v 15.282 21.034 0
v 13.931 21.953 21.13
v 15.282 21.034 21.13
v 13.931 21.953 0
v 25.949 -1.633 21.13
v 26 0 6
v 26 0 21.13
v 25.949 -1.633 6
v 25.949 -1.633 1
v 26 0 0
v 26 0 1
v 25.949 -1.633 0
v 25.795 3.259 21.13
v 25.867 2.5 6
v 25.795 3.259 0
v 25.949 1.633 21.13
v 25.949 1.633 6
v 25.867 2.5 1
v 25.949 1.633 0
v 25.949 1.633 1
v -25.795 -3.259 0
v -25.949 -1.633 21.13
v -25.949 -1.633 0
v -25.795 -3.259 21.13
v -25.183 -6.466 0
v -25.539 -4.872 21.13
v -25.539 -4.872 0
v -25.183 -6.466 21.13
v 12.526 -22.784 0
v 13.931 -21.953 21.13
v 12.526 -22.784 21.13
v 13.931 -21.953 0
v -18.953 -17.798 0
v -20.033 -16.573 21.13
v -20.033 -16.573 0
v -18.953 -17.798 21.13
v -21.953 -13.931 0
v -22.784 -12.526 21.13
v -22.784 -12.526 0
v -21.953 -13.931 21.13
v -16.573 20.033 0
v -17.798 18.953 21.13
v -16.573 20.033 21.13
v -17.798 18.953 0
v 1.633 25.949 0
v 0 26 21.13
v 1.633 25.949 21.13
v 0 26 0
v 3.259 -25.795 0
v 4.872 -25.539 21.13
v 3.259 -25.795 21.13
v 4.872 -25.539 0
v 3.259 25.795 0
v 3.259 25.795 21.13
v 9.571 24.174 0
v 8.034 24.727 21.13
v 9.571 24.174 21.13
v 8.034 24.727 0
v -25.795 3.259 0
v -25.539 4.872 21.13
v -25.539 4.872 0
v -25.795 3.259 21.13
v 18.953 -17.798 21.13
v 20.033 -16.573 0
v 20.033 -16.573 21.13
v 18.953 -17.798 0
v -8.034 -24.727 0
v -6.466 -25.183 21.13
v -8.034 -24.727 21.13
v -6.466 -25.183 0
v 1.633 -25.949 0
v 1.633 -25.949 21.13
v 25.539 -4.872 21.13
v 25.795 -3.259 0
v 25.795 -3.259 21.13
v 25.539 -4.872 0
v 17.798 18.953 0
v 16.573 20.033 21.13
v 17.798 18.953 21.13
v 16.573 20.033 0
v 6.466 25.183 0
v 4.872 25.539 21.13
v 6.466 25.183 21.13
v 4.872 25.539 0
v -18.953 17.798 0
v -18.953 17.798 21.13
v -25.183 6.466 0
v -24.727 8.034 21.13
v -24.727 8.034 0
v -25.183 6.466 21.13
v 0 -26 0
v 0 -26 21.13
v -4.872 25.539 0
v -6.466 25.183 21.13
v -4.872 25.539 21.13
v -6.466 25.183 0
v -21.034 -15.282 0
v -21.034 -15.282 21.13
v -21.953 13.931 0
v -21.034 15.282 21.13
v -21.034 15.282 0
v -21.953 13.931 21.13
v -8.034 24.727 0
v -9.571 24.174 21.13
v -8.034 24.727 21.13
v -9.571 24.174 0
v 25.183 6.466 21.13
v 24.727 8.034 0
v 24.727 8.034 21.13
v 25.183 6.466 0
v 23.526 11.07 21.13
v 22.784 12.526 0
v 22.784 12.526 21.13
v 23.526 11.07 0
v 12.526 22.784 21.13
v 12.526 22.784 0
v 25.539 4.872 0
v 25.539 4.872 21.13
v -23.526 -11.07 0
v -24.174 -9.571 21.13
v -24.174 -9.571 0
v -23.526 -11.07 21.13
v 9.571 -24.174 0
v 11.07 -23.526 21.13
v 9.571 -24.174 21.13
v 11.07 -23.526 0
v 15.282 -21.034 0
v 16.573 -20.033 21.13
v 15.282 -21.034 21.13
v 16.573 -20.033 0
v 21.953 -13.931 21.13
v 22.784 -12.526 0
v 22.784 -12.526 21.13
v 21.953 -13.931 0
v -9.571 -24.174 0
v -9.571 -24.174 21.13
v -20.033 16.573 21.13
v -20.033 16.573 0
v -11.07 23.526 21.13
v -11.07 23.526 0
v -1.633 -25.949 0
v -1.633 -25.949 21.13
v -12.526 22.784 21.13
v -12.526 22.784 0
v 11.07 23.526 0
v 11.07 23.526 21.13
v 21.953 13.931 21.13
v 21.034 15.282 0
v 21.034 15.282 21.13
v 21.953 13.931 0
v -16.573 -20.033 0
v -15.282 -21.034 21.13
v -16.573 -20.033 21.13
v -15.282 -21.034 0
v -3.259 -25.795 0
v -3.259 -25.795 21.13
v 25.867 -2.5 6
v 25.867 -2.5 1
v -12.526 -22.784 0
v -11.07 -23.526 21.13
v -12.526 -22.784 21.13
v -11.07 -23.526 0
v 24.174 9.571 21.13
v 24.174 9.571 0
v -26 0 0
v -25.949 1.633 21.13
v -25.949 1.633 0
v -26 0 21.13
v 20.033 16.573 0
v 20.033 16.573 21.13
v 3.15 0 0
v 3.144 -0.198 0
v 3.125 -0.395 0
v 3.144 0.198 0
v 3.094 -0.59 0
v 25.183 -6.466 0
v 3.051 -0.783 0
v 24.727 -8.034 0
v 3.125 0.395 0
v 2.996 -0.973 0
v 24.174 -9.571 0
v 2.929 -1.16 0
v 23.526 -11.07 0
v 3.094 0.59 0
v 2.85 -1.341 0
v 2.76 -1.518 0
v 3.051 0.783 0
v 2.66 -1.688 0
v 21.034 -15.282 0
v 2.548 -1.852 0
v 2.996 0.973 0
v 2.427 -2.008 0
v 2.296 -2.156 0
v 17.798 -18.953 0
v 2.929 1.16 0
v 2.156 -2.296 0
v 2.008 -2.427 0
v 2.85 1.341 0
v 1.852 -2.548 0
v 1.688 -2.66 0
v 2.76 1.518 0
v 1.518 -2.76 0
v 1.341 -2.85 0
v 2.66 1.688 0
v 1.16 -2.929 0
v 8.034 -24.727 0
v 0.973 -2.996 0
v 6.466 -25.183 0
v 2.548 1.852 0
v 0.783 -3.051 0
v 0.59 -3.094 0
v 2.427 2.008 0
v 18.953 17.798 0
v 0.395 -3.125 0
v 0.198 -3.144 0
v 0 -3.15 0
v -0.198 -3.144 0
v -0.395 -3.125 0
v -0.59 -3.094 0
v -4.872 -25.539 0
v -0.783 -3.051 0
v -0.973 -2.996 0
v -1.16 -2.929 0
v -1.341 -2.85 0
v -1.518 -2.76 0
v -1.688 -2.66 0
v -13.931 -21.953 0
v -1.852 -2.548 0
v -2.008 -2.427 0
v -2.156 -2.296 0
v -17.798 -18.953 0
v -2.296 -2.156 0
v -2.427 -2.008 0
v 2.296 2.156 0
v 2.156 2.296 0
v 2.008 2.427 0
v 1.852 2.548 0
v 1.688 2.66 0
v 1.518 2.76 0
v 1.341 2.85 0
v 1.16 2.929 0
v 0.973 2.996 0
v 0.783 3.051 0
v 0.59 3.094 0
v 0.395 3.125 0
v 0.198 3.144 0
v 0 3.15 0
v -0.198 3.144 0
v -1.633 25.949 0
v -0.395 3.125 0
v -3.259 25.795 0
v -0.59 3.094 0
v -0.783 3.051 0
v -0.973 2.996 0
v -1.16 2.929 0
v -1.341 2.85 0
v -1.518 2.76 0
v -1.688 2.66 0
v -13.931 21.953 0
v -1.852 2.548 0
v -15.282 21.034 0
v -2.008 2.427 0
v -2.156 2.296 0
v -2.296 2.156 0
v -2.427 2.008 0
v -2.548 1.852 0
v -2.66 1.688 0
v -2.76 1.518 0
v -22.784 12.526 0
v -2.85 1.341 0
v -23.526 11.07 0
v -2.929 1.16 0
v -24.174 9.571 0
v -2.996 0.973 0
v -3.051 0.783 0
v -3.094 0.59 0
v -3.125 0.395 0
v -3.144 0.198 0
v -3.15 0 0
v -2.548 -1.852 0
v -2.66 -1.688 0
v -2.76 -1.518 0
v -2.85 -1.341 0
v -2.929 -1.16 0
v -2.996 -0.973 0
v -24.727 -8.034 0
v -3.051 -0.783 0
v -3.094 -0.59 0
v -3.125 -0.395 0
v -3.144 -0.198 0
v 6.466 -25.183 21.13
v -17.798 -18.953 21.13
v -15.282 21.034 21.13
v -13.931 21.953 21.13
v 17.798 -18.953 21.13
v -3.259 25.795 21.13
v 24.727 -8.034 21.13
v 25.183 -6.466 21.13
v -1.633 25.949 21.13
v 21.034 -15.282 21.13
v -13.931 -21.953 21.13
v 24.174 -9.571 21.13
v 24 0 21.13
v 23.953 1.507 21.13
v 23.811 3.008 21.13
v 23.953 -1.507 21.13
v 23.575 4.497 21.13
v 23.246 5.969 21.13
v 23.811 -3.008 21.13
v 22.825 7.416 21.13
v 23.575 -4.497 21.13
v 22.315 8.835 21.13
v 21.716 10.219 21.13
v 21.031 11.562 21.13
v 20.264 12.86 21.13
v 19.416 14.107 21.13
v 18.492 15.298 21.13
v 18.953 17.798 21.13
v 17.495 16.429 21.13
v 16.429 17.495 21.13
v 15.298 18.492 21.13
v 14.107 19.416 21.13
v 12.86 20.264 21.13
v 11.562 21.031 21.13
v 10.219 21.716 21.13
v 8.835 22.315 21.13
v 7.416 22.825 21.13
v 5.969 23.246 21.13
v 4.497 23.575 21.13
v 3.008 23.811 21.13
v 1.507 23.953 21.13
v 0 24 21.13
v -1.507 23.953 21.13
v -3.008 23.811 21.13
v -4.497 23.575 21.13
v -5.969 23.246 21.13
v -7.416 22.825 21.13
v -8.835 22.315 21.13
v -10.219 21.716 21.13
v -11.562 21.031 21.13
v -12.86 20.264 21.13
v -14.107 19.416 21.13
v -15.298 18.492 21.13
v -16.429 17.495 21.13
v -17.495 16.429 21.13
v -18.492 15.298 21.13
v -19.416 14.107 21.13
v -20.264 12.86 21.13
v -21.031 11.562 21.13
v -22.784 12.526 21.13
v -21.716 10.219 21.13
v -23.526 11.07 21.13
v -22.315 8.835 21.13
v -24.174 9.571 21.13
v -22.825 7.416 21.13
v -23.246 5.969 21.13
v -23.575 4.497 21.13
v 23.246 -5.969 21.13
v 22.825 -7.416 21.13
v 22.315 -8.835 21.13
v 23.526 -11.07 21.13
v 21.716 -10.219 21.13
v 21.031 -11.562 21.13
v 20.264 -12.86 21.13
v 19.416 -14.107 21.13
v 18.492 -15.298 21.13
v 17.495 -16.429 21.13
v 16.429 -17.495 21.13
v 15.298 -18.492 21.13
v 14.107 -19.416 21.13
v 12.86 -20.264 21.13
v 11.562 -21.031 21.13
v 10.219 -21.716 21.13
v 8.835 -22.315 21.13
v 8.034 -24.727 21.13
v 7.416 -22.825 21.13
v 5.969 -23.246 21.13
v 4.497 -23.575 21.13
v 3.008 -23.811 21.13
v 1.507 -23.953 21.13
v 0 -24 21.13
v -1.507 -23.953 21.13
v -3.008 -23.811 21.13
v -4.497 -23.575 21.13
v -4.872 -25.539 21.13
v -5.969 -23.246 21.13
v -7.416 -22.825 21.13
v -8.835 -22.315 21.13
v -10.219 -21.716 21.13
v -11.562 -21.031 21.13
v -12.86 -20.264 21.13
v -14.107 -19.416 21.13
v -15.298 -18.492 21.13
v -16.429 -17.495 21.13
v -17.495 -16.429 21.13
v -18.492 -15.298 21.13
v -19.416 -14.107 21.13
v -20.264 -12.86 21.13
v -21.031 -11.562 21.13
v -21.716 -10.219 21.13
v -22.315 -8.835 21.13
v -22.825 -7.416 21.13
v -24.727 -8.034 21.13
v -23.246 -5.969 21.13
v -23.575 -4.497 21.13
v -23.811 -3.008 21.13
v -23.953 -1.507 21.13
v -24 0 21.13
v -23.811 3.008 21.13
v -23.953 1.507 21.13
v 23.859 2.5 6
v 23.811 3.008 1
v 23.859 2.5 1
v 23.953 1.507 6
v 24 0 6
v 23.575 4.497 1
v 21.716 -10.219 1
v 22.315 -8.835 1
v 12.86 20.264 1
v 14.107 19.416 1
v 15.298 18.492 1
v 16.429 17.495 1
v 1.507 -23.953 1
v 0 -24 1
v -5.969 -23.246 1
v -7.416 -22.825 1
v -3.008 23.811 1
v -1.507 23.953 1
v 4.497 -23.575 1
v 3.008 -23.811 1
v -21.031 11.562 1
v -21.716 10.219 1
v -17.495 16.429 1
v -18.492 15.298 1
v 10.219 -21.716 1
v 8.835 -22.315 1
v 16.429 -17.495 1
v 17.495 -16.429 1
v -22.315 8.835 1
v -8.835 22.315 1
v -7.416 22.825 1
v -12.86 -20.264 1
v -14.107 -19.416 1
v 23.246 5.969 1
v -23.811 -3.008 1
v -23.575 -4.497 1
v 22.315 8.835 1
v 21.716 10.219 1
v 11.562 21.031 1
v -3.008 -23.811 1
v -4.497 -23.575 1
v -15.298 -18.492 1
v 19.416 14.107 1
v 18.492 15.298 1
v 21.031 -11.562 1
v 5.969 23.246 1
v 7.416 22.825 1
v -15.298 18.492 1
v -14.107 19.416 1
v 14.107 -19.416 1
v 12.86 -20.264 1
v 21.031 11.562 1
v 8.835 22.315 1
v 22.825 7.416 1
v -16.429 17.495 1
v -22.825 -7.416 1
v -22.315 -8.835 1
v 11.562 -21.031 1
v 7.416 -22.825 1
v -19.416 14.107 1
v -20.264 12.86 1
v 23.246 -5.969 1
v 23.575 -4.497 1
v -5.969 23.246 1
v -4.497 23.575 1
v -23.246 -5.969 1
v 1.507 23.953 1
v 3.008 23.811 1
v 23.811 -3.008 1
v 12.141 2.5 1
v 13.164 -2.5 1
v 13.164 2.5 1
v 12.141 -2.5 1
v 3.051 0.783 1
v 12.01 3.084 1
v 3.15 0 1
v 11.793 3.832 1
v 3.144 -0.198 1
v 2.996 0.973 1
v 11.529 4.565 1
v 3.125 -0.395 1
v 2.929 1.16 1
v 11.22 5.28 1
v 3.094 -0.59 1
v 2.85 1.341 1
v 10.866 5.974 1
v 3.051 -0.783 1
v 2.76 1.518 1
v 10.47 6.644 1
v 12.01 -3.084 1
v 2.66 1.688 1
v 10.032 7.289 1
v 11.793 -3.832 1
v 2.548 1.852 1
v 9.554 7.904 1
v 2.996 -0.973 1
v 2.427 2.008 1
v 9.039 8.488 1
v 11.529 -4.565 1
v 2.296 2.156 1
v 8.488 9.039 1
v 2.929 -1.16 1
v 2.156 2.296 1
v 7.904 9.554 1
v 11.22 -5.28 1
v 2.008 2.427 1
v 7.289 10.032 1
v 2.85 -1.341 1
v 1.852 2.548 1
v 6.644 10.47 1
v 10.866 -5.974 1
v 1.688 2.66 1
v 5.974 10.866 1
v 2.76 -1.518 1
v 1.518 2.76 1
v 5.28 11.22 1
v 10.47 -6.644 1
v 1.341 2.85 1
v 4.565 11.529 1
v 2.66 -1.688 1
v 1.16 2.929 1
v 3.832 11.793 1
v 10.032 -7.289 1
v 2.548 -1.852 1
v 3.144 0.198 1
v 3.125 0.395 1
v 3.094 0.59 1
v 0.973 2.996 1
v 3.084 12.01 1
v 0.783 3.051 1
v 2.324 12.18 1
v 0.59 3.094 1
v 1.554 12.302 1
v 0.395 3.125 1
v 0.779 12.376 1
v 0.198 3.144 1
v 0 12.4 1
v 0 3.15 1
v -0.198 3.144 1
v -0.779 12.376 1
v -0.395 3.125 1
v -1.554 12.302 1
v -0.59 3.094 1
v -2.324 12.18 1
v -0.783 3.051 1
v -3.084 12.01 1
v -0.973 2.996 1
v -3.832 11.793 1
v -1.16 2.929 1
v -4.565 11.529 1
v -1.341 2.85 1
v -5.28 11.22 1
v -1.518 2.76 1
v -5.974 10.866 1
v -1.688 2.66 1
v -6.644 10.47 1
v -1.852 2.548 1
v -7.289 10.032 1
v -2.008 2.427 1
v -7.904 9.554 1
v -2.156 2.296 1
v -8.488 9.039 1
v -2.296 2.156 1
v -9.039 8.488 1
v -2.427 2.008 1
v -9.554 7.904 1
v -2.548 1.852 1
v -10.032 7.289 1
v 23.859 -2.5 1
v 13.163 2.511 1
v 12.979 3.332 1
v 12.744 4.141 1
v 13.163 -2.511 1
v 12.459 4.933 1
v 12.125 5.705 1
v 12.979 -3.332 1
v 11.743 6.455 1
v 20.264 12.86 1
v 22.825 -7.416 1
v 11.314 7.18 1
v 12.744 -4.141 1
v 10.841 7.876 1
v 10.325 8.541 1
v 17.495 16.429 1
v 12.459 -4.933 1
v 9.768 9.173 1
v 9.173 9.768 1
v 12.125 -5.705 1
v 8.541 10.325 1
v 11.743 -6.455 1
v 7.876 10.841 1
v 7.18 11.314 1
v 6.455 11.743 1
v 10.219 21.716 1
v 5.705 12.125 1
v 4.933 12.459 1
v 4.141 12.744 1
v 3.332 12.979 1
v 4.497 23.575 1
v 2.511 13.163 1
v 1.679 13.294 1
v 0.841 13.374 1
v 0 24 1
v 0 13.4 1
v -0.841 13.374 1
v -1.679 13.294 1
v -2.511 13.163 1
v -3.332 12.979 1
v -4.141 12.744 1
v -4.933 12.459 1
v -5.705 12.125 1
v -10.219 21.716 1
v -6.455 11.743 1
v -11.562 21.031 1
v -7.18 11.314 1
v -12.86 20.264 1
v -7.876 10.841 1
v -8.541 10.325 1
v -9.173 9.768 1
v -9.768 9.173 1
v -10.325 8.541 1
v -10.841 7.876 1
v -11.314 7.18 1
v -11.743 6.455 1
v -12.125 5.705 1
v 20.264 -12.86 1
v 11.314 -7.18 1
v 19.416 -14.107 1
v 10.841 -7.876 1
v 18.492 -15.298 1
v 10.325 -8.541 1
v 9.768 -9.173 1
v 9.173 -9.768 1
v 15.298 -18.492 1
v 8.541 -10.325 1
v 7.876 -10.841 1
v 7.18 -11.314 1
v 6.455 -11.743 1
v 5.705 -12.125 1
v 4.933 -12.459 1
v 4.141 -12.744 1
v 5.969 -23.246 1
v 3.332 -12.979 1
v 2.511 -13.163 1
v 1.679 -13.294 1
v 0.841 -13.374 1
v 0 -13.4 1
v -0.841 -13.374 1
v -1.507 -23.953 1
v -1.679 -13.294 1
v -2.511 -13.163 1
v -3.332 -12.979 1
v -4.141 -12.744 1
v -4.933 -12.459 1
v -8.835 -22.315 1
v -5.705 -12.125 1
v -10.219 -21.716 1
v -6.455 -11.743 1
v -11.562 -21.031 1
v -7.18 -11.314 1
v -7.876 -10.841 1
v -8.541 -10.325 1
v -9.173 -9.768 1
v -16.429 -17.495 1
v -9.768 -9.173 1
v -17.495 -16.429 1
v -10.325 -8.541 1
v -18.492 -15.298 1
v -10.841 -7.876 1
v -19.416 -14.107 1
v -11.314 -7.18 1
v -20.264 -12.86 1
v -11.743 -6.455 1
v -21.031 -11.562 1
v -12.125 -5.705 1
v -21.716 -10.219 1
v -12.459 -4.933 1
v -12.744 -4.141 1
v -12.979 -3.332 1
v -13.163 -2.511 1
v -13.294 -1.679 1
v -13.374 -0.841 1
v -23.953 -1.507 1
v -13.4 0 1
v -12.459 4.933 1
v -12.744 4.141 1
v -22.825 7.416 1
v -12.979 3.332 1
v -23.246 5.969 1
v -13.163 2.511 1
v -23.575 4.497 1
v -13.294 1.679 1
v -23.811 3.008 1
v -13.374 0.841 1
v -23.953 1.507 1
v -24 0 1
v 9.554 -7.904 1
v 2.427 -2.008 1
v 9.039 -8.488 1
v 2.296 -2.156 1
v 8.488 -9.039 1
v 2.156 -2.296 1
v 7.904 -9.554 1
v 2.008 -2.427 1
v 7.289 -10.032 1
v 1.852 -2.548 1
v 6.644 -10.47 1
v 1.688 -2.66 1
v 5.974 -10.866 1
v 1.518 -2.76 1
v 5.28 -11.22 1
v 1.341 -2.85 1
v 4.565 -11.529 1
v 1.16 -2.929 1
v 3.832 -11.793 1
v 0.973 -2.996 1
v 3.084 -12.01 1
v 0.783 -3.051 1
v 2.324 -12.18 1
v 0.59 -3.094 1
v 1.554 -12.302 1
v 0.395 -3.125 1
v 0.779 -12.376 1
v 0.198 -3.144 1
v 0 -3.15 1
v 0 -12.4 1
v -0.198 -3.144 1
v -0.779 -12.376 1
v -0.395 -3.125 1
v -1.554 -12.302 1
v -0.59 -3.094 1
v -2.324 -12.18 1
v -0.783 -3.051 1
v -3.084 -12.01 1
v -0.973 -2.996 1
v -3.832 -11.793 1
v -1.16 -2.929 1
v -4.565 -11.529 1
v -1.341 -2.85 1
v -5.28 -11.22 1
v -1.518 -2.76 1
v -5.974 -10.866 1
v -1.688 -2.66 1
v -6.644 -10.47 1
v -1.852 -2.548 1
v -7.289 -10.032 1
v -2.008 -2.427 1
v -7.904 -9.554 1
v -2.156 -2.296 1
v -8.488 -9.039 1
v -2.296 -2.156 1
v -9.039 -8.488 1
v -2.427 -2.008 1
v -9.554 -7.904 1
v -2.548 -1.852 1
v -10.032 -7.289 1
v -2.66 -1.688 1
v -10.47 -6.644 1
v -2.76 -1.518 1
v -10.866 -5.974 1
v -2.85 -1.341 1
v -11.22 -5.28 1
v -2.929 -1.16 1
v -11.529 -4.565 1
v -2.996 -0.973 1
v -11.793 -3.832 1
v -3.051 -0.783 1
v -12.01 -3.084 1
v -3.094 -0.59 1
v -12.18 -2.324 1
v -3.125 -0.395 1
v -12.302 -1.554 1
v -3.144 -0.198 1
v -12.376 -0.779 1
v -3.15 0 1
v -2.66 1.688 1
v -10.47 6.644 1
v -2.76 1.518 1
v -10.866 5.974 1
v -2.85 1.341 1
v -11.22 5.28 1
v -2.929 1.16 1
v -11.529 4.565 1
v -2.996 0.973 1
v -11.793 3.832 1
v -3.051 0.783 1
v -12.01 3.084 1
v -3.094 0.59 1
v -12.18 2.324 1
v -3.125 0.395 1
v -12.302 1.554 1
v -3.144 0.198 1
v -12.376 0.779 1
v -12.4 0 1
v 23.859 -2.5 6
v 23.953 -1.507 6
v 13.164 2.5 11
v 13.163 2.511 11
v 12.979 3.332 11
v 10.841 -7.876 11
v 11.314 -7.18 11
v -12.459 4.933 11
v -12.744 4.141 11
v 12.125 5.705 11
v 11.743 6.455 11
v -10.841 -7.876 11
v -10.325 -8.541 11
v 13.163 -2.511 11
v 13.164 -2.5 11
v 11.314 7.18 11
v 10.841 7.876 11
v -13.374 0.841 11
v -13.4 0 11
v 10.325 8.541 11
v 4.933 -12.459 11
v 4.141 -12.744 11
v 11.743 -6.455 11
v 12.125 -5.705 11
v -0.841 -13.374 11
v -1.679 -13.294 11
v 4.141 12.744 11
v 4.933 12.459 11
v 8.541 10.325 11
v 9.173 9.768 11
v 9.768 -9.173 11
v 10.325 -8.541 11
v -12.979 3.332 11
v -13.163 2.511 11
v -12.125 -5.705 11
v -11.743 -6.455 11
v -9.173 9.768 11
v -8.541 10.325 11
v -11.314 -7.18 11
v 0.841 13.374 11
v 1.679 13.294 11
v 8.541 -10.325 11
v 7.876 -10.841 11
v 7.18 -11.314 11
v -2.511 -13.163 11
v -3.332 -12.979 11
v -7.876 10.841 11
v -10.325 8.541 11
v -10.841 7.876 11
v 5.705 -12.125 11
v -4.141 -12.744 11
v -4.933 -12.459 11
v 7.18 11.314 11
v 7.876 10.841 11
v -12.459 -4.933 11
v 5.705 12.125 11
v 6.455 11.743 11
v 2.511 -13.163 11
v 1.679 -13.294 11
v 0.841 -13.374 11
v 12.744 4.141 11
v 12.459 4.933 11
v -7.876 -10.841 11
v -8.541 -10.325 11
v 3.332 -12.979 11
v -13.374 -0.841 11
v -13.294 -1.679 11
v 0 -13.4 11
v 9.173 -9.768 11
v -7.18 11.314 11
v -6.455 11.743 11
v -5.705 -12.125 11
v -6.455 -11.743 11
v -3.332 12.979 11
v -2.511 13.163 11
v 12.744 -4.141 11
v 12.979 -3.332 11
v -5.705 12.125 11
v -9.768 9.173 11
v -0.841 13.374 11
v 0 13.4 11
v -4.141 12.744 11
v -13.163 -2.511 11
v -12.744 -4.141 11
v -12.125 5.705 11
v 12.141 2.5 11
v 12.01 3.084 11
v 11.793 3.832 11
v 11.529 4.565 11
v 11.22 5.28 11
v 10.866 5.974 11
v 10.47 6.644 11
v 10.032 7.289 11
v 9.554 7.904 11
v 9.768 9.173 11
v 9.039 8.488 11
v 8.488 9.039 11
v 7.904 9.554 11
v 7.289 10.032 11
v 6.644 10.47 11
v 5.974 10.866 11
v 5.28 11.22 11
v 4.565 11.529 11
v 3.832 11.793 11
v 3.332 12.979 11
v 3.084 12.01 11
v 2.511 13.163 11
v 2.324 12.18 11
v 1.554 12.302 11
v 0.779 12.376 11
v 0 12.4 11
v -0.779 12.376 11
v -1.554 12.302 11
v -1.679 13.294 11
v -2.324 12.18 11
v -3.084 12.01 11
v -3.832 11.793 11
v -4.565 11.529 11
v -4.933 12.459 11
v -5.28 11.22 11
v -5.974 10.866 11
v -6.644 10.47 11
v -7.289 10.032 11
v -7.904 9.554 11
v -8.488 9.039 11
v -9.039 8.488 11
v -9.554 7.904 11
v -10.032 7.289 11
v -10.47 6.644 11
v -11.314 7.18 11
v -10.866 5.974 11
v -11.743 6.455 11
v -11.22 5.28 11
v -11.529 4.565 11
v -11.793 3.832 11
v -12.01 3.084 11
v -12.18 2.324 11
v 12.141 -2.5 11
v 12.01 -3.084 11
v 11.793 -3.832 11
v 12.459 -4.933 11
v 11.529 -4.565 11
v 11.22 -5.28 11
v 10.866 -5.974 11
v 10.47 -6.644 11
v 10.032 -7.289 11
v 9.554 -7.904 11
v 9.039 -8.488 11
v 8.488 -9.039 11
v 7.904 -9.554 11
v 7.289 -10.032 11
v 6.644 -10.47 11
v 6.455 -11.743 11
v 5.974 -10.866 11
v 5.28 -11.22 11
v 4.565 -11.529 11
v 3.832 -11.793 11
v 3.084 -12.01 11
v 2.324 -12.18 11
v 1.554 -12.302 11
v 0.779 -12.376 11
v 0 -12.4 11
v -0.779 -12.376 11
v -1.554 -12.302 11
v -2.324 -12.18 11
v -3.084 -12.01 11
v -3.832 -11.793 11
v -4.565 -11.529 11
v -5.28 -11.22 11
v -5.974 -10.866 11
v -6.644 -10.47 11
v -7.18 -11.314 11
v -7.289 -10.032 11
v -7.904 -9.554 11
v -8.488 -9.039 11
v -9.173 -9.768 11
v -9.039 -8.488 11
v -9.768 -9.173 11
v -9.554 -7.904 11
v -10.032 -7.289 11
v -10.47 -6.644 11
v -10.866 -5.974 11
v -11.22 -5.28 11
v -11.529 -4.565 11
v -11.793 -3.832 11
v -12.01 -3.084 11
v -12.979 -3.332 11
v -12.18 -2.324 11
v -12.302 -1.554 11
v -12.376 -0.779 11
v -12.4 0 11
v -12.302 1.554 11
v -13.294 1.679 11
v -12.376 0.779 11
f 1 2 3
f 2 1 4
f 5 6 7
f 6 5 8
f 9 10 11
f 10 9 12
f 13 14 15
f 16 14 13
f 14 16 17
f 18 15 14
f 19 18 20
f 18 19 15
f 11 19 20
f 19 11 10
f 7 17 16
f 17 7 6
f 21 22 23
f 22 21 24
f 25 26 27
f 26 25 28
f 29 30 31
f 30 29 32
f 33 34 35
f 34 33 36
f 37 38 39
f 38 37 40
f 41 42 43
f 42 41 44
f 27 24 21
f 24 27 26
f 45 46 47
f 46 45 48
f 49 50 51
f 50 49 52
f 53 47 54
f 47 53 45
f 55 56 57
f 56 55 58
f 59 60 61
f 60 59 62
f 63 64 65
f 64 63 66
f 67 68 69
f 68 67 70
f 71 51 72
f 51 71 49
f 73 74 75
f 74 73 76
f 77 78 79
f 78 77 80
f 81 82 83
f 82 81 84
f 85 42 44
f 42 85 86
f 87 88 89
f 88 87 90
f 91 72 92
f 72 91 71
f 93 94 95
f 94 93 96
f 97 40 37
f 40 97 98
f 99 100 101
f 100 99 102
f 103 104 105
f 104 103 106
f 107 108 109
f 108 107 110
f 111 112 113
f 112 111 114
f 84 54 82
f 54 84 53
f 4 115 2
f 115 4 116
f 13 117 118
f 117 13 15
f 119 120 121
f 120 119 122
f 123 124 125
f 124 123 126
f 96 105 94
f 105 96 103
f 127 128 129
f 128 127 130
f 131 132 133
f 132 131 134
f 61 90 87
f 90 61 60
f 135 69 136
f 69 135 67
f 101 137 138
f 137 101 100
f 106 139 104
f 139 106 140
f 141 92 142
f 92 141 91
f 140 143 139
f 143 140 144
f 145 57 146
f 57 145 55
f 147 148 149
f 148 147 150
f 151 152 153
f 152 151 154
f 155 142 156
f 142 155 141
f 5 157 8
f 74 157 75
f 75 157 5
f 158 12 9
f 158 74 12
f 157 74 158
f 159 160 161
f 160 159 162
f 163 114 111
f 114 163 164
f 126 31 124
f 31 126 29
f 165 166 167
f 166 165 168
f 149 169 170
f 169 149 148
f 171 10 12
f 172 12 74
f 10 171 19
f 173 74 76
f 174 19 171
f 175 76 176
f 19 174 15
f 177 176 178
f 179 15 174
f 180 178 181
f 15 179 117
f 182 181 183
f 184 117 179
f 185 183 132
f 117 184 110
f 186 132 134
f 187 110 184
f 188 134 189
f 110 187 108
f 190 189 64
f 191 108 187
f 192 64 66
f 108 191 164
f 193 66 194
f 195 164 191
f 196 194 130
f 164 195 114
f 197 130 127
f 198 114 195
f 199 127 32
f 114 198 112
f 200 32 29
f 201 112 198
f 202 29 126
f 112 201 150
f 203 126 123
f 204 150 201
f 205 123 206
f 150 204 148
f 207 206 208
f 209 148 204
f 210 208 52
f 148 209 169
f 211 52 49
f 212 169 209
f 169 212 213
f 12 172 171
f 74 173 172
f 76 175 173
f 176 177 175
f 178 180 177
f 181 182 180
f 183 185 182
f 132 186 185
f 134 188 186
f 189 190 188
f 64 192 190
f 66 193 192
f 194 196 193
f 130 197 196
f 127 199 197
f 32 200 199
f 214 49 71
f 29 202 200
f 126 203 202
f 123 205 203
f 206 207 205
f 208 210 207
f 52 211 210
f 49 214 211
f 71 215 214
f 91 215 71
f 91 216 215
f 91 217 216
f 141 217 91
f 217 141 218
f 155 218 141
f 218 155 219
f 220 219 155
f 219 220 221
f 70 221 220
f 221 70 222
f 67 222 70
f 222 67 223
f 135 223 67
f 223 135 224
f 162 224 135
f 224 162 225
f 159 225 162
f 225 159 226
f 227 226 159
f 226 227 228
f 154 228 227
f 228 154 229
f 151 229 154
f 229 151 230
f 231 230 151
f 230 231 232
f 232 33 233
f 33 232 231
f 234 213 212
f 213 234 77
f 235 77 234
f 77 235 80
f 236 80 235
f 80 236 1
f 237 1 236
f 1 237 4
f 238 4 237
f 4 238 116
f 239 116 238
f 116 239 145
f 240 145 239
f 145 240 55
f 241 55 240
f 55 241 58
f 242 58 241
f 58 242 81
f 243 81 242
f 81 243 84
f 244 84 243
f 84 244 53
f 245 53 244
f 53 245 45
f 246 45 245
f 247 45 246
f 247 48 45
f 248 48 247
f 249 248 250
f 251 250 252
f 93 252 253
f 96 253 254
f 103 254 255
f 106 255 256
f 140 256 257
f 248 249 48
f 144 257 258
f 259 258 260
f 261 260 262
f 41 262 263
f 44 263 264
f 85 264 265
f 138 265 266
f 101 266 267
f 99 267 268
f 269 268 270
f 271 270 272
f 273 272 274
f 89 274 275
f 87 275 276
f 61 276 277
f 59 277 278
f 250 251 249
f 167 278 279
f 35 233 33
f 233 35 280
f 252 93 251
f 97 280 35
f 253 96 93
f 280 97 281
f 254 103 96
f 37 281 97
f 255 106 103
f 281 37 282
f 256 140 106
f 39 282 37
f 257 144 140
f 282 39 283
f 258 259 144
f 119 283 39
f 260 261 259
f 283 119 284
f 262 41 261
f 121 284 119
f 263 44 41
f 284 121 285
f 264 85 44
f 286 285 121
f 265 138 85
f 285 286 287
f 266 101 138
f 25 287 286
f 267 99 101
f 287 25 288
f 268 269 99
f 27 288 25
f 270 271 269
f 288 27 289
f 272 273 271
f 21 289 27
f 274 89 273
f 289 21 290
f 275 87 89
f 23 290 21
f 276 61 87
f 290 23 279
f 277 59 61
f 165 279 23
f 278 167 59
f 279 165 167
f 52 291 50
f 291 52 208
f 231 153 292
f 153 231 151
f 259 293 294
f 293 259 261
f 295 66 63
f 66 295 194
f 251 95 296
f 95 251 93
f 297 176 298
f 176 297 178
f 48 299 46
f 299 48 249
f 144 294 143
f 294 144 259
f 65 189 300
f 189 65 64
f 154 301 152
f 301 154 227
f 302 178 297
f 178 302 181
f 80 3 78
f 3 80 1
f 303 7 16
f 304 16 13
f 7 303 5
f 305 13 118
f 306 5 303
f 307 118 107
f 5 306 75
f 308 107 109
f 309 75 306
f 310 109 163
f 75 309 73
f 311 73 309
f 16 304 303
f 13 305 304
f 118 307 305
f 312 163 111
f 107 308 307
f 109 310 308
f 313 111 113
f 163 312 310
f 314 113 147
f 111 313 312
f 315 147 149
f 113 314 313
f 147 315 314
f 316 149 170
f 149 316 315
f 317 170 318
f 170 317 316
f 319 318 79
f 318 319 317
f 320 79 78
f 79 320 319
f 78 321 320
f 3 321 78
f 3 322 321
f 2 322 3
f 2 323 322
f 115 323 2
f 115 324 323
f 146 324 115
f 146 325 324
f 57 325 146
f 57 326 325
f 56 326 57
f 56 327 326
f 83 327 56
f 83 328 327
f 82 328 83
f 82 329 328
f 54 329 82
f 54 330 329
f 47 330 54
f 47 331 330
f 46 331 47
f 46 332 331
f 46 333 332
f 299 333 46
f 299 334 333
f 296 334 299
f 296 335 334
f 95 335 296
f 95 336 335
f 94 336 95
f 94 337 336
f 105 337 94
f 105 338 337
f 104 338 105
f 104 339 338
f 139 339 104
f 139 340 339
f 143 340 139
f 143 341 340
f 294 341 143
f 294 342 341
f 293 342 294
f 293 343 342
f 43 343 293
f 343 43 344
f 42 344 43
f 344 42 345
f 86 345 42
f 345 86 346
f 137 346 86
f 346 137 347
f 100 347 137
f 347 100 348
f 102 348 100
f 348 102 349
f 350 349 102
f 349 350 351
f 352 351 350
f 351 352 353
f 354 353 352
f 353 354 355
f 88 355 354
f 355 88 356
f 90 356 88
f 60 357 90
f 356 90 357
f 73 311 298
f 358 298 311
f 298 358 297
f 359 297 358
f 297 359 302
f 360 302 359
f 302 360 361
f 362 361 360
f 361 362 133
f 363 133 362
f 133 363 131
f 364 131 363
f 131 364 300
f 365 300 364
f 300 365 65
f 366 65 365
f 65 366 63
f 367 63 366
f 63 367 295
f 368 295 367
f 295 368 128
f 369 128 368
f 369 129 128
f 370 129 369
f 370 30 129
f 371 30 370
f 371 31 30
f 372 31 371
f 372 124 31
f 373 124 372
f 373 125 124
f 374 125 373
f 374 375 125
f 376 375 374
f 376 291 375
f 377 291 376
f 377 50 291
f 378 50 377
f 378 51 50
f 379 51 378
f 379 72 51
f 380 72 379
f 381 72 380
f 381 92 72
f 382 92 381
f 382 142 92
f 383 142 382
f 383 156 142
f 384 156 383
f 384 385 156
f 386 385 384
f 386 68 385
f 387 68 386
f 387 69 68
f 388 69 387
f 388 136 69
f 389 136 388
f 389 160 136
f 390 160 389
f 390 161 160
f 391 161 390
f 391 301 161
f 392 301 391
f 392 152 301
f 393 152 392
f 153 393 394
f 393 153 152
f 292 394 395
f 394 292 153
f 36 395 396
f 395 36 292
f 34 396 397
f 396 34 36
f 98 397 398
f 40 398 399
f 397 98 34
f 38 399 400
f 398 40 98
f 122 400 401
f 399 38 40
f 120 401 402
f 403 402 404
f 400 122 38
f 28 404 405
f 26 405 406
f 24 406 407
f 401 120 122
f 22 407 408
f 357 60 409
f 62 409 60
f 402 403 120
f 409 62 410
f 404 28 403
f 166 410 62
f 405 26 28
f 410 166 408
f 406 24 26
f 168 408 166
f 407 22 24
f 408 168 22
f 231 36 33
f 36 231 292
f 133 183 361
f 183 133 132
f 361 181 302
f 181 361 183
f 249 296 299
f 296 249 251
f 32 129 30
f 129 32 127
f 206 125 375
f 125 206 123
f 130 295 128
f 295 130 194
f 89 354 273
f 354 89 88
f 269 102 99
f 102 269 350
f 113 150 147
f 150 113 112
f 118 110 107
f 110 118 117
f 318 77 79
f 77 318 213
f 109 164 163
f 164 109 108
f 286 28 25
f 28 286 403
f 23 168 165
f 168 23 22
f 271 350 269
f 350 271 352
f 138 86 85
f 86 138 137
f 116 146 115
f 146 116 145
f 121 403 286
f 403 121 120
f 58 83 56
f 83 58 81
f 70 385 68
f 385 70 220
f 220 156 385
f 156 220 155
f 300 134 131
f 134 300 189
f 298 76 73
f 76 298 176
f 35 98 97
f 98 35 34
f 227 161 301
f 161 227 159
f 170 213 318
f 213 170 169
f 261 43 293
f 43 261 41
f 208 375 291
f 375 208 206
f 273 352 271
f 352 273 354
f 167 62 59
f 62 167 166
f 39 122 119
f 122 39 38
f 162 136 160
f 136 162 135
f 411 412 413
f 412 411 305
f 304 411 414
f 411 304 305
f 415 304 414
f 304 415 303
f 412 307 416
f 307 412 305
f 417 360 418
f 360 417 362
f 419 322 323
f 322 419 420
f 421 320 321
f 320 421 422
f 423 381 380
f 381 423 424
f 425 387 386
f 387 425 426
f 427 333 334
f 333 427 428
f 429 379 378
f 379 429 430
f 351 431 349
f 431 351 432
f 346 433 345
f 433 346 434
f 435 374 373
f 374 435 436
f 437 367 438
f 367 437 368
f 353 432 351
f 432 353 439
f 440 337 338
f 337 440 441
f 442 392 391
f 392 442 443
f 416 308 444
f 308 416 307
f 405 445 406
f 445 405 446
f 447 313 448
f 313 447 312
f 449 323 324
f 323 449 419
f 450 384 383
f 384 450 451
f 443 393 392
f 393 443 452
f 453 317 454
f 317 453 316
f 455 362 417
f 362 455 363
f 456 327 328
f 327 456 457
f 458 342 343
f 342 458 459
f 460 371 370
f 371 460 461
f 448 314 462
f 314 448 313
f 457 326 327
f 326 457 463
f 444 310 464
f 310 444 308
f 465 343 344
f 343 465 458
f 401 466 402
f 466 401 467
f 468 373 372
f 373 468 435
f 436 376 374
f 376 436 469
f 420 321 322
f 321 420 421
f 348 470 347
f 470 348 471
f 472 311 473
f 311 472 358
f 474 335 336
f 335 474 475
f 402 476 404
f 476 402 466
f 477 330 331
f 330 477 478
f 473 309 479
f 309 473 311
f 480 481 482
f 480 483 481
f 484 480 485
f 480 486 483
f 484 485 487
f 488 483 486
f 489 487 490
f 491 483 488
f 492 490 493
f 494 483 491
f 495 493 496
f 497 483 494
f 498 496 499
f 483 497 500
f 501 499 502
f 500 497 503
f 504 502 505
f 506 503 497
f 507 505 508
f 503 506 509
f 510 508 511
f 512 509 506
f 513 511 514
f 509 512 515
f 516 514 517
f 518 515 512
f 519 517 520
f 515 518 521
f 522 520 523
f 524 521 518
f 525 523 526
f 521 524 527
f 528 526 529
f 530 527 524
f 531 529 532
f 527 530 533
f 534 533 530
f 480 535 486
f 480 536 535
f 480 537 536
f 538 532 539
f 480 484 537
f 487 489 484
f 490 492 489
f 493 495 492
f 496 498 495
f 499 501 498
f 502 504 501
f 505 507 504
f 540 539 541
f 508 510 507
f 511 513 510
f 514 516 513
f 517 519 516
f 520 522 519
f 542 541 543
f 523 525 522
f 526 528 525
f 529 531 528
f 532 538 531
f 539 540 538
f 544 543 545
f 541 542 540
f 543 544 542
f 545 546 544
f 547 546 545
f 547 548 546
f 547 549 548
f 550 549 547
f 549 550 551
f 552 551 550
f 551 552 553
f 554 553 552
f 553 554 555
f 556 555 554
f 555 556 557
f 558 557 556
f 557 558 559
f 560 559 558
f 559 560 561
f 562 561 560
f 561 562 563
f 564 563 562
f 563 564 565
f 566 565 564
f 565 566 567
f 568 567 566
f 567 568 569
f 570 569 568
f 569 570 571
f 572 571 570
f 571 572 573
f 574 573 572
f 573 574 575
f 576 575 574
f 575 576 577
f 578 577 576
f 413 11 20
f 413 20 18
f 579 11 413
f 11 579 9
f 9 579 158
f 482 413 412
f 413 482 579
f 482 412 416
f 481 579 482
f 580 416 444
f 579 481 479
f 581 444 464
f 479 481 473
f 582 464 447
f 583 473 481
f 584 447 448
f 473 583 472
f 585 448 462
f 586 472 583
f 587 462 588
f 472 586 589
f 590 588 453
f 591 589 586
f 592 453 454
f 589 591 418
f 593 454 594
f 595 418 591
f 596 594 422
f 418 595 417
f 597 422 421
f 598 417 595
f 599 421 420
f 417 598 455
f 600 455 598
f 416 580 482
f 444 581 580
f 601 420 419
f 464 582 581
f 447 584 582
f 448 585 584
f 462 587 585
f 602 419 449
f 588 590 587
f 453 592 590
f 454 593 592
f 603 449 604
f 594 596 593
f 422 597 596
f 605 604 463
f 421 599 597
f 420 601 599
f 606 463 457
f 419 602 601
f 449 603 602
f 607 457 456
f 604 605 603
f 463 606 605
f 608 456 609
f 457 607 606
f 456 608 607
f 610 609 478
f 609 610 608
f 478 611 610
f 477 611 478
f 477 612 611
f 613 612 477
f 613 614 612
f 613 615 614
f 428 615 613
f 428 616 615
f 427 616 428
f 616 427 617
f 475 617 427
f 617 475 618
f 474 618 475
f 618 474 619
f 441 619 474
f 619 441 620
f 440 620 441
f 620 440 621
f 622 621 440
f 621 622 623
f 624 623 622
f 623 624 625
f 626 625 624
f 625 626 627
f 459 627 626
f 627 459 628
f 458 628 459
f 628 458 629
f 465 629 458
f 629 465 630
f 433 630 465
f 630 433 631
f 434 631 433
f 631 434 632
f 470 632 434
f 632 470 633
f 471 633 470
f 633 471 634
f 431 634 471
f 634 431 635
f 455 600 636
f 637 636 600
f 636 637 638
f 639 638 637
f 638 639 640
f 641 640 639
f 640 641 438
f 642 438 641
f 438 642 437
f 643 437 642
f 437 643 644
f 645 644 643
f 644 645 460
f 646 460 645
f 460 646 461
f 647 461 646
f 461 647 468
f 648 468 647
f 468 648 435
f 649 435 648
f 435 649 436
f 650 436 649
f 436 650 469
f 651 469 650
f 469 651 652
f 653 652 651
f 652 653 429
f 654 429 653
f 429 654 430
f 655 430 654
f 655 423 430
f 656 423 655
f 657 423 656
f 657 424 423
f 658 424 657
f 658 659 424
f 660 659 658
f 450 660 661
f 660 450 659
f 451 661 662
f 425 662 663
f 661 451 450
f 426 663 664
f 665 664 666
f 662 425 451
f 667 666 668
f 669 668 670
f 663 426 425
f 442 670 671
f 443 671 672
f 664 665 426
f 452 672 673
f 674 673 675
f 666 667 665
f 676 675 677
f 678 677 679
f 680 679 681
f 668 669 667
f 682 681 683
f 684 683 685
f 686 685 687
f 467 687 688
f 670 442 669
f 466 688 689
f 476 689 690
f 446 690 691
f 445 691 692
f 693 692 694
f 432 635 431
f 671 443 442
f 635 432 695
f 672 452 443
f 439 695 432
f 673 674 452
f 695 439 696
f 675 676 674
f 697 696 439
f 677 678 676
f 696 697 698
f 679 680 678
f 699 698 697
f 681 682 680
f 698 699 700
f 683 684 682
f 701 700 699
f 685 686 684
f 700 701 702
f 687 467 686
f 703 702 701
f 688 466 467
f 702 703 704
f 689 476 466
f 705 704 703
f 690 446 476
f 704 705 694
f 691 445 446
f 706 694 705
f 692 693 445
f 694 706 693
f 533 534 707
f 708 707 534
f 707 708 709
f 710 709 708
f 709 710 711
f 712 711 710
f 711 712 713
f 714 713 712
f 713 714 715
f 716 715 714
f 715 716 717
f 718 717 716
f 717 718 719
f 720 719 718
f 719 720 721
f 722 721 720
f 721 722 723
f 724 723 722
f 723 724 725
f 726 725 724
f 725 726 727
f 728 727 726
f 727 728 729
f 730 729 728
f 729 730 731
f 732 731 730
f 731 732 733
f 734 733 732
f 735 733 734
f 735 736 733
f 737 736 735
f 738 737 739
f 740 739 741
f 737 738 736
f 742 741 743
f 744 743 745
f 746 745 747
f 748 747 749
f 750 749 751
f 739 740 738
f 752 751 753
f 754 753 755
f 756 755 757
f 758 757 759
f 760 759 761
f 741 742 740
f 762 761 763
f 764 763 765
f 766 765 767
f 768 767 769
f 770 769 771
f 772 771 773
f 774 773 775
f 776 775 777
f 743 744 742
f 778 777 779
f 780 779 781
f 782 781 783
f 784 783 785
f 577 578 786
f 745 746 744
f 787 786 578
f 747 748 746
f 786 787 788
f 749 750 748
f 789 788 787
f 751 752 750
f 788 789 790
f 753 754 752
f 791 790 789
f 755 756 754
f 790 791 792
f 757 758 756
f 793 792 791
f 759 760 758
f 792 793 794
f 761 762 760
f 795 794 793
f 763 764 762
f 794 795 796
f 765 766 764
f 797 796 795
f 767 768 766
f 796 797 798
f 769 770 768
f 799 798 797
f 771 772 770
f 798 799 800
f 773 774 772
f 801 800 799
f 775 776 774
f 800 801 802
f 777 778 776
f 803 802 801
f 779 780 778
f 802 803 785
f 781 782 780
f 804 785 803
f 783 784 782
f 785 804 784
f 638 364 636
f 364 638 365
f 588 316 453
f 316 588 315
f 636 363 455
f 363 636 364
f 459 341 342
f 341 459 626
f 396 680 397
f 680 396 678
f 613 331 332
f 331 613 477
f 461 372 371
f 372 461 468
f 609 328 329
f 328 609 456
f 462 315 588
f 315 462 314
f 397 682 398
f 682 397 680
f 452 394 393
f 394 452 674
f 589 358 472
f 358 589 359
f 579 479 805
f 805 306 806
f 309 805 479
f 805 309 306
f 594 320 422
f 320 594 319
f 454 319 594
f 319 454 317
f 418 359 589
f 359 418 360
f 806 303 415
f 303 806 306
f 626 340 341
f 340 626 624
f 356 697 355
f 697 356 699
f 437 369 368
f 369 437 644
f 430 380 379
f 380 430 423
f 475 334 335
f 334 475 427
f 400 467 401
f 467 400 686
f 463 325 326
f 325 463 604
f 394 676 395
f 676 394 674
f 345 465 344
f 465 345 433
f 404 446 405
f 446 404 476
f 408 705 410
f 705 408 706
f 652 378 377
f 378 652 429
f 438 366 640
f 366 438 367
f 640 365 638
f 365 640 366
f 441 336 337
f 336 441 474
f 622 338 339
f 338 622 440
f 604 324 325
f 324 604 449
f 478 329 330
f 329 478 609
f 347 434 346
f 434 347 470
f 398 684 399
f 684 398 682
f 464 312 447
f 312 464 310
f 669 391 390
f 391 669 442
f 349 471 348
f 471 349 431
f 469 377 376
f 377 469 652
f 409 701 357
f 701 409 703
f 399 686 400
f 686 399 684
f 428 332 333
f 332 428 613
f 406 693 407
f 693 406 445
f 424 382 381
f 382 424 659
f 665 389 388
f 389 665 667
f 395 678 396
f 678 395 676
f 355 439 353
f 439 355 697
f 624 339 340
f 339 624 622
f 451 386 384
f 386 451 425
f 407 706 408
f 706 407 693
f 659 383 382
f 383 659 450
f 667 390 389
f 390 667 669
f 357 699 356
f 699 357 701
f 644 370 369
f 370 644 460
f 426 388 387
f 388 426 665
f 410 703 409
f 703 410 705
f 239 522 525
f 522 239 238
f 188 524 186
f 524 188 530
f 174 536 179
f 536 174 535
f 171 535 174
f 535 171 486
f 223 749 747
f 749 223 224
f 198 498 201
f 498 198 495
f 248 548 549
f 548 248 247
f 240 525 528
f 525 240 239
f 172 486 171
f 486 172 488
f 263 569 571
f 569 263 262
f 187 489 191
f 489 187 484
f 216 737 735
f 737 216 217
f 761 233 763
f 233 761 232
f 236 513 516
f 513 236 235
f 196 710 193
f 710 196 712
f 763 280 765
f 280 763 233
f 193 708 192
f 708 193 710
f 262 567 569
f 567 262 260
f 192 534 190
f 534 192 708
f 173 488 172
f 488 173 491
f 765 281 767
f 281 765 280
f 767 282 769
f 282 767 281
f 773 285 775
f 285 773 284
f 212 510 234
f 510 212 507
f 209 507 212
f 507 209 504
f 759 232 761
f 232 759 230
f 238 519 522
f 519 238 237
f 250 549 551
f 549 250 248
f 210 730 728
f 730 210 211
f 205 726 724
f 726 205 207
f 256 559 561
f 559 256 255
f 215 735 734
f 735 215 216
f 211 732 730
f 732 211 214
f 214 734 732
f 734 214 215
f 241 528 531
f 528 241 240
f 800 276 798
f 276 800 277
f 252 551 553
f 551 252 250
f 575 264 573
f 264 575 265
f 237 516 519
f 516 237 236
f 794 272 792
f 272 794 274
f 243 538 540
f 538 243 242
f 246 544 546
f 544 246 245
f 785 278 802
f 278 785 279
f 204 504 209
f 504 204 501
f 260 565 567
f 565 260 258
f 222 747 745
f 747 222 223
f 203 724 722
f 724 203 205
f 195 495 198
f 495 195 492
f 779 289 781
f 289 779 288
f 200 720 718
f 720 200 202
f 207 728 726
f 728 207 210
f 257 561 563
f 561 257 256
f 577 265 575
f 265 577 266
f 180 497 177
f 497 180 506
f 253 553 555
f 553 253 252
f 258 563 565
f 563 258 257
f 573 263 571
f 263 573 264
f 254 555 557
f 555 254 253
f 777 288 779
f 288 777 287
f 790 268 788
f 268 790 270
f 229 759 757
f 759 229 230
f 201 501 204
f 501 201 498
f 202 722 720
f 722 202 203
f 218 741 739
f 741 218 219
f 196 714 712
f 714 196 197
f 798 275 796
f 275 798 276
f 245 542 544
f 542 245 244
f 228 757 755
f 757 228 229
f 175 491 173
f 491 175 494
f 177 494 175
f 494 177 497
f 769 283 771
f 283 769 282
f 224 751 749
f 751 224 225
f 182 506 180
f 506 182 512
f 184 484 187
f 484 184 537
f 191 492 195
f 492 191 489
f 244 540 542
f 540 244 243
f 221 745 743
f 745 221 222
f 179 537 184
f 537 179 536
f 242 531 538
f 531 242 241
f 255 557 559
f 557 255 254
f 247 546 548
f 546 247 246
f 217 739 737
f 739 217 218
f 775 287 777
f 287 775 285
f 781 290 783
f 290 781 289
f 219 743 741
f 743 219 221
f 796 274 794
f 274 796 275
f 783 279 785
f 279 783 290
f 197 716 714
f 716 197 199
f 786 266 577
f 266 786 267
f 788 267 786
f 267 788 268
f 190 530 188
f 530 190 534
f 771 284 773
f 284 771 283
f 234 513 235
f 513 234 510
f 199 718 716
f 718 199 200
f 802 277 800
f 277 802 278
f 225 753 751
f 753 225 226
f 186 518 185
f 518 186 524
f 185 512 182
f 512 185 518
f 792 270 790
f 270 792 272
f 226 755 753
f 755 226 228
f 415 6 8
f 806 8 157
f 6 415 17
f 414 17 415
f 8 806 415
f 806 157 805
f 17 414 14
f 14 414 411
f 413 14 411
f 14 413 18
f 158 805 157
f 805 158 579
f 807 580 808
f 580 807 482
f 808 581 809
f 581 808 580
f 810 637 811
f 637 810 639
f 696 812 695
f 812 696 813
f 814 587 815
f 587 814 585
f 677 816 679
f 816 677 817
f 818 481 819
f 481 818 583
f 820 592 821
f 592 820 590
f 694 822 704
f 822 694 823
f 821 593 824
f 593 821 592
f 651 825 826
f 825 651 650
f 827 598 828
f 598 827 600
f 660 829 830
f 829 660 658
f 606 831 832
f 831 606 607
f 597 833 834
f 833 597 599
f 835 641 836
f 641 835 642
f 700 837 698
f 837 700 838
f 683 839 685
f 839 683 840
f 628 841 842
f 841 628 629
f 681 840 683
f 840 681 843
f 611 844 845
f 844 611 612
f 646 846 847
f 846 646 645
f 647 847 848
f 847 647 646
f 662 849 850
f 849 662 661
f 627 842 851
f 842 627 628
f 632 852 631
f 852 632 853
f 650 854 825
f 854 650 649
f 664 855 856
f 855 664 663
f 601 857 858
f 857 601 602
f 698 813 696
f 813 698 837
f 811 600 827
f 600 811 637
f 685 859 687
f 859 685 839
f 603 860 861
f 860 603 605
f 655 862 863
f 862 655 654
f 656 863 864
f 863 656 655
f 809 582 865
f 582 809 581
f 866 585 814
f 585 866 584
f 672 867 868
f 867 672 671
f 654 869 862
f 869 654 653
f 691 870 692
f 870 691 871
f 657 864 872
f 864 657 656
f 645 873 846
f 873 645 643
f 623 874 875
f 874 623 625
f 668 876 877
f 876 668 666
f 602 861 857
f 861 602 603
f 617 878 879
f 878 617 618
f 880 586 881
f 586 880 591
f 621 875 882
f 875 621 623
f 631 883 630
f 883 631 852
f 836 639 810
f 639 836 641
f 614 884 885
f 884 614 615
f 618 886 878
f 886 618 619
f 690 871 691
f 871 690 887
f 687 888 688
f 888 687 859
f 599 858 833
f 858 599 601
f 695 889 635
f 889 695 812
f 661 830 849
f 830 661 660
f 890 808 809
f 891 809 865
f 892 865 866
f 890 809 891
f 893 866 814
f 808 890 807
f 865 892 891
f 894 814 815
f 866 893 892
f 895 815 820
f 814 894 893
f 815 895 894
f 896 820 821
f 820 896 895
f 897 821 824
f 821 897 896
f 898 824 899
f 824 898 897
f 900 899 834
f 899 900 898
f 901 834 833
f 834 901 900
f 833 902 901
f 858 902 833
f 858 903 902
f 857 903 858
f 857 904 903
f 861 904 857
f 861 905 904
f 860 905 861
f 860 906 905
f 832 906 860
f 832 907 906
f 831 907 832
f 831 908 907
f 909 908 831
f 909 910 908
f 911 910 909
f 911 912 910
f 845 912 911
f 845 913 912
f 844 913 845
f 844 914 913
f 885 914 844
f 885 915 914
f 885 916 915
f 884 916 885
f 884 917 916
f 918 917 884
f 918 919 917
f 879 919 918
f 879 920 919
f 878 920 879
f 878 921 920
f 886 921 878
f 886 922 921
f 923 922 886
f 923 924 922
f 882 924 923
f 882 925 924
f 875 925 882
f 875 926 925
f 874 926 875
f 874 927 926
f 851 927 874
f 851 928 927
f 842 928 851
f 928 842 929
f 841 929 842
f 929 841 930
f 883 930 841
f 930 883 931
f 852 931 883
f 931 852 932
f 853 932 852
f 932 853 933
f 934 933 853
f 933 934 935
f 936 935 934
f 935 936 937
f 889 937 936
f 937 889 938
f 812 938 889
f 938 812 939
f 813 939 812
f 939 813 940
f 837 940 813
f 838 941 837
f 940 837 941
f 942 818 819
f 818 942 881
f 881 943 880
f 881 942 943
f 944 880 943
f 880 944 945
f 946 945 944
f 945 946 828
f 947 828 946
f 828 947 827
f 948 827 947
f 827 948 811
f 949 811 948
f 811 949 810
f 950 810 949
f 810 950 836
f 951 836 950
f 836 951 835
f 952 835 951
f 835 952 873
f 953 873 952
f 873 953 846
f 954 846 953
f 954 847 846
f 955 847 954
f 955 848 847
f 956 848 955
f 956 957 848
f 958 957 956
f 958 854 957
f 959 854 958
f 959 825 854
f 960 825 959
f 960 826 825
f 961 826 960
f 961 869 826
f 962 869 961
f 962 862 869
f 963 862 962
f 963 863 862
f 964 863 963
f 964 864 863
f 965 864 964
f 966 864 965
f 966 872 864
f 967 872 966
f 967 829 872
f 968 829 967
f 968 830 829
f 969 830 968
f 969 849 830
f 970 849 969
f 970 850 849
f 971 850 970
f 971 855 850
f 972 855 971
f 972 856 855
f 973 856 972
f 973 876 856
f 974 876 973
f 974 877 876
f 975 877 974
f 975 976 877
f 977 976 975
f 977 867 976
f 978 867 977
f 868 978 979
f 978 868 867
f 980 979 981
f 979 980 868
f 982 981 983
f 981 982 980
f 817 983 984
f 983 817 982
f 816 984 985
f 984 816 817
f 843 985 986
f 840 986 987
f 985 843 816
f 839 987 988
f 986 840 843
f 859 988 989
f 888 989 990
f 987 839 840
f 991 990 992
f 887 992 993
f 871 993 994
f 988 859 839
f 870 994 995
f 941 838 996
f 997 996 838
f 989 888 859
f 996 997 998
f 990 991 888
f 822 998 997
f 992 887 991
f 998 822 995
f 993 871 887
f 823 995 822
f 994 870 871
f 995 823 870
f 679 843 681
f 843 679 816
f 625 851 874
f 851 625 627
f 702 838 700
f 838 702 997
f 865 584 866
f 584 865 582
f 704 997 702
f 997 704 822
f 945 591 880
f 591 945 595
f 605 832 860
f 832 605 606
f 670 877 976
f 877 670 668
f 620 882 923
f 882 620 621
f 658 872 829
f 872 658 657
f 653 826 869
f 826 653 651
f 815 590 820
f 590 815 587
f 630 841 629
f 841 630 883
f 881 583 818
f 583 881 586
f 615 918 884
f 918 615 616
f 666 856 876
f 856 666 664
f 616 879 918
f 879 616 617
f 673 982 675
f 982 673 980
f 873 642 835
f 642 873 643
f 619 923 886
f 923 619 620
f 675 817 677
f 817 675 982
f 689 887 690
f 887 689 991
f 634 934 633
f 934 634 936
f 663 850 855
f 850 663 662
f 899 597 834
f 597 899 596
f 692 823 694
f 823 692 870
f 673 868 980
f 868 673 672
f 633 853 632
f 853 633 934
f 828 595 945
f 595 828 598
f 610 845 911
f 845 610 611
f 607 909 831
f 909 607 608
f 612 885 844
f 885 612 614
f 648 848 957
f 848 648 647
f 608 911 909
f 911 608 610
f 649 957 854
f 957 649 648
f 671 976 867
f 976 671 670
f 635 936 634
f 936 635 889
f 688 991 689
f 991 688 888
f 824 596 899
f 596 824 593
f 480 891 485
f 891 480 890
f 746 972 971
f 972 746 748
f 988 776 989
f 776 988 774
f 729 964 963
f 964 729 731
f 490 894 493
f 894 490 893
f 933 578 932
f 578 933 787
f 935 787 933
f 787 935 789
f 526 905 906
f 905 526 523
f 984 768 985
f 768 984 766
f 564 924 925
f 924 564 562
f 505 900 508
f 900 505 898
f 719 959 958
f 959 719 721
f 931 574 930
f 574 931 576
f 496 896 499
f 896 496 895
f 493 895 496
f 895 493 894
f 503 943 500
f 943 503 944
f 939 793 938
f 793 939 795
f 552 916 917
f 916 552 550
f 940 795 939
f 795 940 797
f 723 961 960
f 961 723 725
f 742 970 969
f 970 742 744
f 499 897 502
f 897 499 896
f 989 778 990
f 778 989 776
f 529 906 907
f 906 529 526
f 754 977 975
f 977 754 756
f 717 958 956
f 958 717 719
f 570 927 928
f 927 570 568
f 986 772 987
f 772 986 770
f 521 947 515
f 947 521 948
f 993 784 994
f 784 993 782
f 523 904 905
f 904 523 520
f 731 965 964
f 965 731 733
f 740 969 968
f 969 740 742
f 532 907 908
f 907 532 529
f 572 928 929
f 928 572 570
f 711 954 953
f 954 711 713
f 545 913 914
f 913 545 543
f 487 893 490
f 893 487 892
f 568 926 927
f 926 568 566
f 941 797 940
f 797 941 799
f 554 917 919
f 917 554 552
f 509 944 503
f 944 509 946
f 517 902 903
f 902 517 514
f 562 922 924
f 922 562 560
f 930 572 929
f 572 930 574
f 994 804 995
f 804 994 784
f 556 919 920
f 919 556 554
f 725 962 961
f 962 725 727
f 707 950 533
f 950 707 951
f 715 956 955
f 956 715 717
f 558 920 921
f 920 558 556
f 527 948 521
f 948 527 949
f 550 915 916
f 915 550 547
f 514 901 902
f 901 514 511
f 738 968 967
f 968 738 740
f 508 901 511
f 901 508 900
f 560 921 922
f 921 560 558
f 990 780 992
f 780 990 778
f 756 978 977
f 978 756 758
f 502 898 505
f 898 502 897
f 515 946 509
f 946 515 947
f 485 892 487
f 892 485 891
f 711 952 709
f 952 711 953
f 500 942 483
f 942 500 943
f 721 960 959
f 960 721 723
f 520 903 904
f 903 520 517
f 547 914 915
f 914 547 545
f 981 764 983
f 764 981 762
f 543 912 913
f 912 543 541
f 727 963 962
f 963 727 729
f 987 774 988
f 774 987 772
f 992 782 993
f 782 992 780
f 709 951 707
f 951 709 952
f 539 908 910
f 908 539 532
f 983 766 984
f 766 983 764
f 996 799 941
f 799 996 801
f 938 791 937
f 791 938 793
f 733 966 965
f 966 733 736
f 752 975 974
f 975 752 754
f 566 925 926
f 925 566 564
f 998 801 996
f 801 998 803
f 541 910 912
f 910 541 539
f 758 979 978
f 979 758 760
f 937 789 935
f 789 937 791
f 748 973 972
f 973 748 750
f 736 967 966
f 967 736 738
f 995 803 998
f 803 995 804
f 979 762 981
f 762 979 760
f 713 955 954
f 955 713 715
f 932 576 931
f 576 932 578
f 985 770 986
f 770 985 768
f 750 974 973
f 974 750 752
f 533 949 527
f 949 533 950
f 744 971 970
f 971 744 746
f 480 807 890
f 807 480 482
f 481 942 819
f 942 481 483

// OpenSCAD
$fn=100;

motor_width = 24;
motor_back_hole_width = 6.3;
motor_height = 12.36;
motor_pin_height = 20.13;

holder_height = 10;

skirt_plate_dist = 2; // distance from top skirt to magnet plate
skirt_width = 10;

plate_width = 40;

cage_width = motor_width + skirt_plate_dist + skirt_width;
cage_plate_dist = 1; // distance from top of skirt to top of plate
cage_height = motor_pin_height + cage_plate_dist;


wt = 1;

cage(); 
//skirt();
//translate([0,0,motor_pin_height+wt-5]) cylinder(h=5, r=20);

module cage() {
    difference() {
        cylinder(h=cage_height, r=motor_width+2);
        translate([0,0,wt]) cylinder(h=cage_height, r=motor_width);
        translate([0,0,-10]) cylinder(h=20, r=motor_back_hole_width/2);
        translate([motor_width,0,wt+2.5]) cube(5, center=true);
    }
    translate([0,0,wt]) difference() {
        cylinder(h=holder_height, r=motor_width/2+wt+0.4);
        translate([0,0,-5]) cylinder(h=holder_height+10, r=motor_width/2+0.4);
        translate([motor_width/2-wt,0,(holder_height+2)/2]) cube([10, 5, holder_height+2], center=true);
    }
}

module skirt() {
    difference() {
        translate([0,0,cage_height]) cylinder(h=wt, r=motor_width+2);
        translate([0,0,cage_height-1]) cylinder(h=wt+2, r=plate_width/2+skirt_plate_dist);
    }
}
